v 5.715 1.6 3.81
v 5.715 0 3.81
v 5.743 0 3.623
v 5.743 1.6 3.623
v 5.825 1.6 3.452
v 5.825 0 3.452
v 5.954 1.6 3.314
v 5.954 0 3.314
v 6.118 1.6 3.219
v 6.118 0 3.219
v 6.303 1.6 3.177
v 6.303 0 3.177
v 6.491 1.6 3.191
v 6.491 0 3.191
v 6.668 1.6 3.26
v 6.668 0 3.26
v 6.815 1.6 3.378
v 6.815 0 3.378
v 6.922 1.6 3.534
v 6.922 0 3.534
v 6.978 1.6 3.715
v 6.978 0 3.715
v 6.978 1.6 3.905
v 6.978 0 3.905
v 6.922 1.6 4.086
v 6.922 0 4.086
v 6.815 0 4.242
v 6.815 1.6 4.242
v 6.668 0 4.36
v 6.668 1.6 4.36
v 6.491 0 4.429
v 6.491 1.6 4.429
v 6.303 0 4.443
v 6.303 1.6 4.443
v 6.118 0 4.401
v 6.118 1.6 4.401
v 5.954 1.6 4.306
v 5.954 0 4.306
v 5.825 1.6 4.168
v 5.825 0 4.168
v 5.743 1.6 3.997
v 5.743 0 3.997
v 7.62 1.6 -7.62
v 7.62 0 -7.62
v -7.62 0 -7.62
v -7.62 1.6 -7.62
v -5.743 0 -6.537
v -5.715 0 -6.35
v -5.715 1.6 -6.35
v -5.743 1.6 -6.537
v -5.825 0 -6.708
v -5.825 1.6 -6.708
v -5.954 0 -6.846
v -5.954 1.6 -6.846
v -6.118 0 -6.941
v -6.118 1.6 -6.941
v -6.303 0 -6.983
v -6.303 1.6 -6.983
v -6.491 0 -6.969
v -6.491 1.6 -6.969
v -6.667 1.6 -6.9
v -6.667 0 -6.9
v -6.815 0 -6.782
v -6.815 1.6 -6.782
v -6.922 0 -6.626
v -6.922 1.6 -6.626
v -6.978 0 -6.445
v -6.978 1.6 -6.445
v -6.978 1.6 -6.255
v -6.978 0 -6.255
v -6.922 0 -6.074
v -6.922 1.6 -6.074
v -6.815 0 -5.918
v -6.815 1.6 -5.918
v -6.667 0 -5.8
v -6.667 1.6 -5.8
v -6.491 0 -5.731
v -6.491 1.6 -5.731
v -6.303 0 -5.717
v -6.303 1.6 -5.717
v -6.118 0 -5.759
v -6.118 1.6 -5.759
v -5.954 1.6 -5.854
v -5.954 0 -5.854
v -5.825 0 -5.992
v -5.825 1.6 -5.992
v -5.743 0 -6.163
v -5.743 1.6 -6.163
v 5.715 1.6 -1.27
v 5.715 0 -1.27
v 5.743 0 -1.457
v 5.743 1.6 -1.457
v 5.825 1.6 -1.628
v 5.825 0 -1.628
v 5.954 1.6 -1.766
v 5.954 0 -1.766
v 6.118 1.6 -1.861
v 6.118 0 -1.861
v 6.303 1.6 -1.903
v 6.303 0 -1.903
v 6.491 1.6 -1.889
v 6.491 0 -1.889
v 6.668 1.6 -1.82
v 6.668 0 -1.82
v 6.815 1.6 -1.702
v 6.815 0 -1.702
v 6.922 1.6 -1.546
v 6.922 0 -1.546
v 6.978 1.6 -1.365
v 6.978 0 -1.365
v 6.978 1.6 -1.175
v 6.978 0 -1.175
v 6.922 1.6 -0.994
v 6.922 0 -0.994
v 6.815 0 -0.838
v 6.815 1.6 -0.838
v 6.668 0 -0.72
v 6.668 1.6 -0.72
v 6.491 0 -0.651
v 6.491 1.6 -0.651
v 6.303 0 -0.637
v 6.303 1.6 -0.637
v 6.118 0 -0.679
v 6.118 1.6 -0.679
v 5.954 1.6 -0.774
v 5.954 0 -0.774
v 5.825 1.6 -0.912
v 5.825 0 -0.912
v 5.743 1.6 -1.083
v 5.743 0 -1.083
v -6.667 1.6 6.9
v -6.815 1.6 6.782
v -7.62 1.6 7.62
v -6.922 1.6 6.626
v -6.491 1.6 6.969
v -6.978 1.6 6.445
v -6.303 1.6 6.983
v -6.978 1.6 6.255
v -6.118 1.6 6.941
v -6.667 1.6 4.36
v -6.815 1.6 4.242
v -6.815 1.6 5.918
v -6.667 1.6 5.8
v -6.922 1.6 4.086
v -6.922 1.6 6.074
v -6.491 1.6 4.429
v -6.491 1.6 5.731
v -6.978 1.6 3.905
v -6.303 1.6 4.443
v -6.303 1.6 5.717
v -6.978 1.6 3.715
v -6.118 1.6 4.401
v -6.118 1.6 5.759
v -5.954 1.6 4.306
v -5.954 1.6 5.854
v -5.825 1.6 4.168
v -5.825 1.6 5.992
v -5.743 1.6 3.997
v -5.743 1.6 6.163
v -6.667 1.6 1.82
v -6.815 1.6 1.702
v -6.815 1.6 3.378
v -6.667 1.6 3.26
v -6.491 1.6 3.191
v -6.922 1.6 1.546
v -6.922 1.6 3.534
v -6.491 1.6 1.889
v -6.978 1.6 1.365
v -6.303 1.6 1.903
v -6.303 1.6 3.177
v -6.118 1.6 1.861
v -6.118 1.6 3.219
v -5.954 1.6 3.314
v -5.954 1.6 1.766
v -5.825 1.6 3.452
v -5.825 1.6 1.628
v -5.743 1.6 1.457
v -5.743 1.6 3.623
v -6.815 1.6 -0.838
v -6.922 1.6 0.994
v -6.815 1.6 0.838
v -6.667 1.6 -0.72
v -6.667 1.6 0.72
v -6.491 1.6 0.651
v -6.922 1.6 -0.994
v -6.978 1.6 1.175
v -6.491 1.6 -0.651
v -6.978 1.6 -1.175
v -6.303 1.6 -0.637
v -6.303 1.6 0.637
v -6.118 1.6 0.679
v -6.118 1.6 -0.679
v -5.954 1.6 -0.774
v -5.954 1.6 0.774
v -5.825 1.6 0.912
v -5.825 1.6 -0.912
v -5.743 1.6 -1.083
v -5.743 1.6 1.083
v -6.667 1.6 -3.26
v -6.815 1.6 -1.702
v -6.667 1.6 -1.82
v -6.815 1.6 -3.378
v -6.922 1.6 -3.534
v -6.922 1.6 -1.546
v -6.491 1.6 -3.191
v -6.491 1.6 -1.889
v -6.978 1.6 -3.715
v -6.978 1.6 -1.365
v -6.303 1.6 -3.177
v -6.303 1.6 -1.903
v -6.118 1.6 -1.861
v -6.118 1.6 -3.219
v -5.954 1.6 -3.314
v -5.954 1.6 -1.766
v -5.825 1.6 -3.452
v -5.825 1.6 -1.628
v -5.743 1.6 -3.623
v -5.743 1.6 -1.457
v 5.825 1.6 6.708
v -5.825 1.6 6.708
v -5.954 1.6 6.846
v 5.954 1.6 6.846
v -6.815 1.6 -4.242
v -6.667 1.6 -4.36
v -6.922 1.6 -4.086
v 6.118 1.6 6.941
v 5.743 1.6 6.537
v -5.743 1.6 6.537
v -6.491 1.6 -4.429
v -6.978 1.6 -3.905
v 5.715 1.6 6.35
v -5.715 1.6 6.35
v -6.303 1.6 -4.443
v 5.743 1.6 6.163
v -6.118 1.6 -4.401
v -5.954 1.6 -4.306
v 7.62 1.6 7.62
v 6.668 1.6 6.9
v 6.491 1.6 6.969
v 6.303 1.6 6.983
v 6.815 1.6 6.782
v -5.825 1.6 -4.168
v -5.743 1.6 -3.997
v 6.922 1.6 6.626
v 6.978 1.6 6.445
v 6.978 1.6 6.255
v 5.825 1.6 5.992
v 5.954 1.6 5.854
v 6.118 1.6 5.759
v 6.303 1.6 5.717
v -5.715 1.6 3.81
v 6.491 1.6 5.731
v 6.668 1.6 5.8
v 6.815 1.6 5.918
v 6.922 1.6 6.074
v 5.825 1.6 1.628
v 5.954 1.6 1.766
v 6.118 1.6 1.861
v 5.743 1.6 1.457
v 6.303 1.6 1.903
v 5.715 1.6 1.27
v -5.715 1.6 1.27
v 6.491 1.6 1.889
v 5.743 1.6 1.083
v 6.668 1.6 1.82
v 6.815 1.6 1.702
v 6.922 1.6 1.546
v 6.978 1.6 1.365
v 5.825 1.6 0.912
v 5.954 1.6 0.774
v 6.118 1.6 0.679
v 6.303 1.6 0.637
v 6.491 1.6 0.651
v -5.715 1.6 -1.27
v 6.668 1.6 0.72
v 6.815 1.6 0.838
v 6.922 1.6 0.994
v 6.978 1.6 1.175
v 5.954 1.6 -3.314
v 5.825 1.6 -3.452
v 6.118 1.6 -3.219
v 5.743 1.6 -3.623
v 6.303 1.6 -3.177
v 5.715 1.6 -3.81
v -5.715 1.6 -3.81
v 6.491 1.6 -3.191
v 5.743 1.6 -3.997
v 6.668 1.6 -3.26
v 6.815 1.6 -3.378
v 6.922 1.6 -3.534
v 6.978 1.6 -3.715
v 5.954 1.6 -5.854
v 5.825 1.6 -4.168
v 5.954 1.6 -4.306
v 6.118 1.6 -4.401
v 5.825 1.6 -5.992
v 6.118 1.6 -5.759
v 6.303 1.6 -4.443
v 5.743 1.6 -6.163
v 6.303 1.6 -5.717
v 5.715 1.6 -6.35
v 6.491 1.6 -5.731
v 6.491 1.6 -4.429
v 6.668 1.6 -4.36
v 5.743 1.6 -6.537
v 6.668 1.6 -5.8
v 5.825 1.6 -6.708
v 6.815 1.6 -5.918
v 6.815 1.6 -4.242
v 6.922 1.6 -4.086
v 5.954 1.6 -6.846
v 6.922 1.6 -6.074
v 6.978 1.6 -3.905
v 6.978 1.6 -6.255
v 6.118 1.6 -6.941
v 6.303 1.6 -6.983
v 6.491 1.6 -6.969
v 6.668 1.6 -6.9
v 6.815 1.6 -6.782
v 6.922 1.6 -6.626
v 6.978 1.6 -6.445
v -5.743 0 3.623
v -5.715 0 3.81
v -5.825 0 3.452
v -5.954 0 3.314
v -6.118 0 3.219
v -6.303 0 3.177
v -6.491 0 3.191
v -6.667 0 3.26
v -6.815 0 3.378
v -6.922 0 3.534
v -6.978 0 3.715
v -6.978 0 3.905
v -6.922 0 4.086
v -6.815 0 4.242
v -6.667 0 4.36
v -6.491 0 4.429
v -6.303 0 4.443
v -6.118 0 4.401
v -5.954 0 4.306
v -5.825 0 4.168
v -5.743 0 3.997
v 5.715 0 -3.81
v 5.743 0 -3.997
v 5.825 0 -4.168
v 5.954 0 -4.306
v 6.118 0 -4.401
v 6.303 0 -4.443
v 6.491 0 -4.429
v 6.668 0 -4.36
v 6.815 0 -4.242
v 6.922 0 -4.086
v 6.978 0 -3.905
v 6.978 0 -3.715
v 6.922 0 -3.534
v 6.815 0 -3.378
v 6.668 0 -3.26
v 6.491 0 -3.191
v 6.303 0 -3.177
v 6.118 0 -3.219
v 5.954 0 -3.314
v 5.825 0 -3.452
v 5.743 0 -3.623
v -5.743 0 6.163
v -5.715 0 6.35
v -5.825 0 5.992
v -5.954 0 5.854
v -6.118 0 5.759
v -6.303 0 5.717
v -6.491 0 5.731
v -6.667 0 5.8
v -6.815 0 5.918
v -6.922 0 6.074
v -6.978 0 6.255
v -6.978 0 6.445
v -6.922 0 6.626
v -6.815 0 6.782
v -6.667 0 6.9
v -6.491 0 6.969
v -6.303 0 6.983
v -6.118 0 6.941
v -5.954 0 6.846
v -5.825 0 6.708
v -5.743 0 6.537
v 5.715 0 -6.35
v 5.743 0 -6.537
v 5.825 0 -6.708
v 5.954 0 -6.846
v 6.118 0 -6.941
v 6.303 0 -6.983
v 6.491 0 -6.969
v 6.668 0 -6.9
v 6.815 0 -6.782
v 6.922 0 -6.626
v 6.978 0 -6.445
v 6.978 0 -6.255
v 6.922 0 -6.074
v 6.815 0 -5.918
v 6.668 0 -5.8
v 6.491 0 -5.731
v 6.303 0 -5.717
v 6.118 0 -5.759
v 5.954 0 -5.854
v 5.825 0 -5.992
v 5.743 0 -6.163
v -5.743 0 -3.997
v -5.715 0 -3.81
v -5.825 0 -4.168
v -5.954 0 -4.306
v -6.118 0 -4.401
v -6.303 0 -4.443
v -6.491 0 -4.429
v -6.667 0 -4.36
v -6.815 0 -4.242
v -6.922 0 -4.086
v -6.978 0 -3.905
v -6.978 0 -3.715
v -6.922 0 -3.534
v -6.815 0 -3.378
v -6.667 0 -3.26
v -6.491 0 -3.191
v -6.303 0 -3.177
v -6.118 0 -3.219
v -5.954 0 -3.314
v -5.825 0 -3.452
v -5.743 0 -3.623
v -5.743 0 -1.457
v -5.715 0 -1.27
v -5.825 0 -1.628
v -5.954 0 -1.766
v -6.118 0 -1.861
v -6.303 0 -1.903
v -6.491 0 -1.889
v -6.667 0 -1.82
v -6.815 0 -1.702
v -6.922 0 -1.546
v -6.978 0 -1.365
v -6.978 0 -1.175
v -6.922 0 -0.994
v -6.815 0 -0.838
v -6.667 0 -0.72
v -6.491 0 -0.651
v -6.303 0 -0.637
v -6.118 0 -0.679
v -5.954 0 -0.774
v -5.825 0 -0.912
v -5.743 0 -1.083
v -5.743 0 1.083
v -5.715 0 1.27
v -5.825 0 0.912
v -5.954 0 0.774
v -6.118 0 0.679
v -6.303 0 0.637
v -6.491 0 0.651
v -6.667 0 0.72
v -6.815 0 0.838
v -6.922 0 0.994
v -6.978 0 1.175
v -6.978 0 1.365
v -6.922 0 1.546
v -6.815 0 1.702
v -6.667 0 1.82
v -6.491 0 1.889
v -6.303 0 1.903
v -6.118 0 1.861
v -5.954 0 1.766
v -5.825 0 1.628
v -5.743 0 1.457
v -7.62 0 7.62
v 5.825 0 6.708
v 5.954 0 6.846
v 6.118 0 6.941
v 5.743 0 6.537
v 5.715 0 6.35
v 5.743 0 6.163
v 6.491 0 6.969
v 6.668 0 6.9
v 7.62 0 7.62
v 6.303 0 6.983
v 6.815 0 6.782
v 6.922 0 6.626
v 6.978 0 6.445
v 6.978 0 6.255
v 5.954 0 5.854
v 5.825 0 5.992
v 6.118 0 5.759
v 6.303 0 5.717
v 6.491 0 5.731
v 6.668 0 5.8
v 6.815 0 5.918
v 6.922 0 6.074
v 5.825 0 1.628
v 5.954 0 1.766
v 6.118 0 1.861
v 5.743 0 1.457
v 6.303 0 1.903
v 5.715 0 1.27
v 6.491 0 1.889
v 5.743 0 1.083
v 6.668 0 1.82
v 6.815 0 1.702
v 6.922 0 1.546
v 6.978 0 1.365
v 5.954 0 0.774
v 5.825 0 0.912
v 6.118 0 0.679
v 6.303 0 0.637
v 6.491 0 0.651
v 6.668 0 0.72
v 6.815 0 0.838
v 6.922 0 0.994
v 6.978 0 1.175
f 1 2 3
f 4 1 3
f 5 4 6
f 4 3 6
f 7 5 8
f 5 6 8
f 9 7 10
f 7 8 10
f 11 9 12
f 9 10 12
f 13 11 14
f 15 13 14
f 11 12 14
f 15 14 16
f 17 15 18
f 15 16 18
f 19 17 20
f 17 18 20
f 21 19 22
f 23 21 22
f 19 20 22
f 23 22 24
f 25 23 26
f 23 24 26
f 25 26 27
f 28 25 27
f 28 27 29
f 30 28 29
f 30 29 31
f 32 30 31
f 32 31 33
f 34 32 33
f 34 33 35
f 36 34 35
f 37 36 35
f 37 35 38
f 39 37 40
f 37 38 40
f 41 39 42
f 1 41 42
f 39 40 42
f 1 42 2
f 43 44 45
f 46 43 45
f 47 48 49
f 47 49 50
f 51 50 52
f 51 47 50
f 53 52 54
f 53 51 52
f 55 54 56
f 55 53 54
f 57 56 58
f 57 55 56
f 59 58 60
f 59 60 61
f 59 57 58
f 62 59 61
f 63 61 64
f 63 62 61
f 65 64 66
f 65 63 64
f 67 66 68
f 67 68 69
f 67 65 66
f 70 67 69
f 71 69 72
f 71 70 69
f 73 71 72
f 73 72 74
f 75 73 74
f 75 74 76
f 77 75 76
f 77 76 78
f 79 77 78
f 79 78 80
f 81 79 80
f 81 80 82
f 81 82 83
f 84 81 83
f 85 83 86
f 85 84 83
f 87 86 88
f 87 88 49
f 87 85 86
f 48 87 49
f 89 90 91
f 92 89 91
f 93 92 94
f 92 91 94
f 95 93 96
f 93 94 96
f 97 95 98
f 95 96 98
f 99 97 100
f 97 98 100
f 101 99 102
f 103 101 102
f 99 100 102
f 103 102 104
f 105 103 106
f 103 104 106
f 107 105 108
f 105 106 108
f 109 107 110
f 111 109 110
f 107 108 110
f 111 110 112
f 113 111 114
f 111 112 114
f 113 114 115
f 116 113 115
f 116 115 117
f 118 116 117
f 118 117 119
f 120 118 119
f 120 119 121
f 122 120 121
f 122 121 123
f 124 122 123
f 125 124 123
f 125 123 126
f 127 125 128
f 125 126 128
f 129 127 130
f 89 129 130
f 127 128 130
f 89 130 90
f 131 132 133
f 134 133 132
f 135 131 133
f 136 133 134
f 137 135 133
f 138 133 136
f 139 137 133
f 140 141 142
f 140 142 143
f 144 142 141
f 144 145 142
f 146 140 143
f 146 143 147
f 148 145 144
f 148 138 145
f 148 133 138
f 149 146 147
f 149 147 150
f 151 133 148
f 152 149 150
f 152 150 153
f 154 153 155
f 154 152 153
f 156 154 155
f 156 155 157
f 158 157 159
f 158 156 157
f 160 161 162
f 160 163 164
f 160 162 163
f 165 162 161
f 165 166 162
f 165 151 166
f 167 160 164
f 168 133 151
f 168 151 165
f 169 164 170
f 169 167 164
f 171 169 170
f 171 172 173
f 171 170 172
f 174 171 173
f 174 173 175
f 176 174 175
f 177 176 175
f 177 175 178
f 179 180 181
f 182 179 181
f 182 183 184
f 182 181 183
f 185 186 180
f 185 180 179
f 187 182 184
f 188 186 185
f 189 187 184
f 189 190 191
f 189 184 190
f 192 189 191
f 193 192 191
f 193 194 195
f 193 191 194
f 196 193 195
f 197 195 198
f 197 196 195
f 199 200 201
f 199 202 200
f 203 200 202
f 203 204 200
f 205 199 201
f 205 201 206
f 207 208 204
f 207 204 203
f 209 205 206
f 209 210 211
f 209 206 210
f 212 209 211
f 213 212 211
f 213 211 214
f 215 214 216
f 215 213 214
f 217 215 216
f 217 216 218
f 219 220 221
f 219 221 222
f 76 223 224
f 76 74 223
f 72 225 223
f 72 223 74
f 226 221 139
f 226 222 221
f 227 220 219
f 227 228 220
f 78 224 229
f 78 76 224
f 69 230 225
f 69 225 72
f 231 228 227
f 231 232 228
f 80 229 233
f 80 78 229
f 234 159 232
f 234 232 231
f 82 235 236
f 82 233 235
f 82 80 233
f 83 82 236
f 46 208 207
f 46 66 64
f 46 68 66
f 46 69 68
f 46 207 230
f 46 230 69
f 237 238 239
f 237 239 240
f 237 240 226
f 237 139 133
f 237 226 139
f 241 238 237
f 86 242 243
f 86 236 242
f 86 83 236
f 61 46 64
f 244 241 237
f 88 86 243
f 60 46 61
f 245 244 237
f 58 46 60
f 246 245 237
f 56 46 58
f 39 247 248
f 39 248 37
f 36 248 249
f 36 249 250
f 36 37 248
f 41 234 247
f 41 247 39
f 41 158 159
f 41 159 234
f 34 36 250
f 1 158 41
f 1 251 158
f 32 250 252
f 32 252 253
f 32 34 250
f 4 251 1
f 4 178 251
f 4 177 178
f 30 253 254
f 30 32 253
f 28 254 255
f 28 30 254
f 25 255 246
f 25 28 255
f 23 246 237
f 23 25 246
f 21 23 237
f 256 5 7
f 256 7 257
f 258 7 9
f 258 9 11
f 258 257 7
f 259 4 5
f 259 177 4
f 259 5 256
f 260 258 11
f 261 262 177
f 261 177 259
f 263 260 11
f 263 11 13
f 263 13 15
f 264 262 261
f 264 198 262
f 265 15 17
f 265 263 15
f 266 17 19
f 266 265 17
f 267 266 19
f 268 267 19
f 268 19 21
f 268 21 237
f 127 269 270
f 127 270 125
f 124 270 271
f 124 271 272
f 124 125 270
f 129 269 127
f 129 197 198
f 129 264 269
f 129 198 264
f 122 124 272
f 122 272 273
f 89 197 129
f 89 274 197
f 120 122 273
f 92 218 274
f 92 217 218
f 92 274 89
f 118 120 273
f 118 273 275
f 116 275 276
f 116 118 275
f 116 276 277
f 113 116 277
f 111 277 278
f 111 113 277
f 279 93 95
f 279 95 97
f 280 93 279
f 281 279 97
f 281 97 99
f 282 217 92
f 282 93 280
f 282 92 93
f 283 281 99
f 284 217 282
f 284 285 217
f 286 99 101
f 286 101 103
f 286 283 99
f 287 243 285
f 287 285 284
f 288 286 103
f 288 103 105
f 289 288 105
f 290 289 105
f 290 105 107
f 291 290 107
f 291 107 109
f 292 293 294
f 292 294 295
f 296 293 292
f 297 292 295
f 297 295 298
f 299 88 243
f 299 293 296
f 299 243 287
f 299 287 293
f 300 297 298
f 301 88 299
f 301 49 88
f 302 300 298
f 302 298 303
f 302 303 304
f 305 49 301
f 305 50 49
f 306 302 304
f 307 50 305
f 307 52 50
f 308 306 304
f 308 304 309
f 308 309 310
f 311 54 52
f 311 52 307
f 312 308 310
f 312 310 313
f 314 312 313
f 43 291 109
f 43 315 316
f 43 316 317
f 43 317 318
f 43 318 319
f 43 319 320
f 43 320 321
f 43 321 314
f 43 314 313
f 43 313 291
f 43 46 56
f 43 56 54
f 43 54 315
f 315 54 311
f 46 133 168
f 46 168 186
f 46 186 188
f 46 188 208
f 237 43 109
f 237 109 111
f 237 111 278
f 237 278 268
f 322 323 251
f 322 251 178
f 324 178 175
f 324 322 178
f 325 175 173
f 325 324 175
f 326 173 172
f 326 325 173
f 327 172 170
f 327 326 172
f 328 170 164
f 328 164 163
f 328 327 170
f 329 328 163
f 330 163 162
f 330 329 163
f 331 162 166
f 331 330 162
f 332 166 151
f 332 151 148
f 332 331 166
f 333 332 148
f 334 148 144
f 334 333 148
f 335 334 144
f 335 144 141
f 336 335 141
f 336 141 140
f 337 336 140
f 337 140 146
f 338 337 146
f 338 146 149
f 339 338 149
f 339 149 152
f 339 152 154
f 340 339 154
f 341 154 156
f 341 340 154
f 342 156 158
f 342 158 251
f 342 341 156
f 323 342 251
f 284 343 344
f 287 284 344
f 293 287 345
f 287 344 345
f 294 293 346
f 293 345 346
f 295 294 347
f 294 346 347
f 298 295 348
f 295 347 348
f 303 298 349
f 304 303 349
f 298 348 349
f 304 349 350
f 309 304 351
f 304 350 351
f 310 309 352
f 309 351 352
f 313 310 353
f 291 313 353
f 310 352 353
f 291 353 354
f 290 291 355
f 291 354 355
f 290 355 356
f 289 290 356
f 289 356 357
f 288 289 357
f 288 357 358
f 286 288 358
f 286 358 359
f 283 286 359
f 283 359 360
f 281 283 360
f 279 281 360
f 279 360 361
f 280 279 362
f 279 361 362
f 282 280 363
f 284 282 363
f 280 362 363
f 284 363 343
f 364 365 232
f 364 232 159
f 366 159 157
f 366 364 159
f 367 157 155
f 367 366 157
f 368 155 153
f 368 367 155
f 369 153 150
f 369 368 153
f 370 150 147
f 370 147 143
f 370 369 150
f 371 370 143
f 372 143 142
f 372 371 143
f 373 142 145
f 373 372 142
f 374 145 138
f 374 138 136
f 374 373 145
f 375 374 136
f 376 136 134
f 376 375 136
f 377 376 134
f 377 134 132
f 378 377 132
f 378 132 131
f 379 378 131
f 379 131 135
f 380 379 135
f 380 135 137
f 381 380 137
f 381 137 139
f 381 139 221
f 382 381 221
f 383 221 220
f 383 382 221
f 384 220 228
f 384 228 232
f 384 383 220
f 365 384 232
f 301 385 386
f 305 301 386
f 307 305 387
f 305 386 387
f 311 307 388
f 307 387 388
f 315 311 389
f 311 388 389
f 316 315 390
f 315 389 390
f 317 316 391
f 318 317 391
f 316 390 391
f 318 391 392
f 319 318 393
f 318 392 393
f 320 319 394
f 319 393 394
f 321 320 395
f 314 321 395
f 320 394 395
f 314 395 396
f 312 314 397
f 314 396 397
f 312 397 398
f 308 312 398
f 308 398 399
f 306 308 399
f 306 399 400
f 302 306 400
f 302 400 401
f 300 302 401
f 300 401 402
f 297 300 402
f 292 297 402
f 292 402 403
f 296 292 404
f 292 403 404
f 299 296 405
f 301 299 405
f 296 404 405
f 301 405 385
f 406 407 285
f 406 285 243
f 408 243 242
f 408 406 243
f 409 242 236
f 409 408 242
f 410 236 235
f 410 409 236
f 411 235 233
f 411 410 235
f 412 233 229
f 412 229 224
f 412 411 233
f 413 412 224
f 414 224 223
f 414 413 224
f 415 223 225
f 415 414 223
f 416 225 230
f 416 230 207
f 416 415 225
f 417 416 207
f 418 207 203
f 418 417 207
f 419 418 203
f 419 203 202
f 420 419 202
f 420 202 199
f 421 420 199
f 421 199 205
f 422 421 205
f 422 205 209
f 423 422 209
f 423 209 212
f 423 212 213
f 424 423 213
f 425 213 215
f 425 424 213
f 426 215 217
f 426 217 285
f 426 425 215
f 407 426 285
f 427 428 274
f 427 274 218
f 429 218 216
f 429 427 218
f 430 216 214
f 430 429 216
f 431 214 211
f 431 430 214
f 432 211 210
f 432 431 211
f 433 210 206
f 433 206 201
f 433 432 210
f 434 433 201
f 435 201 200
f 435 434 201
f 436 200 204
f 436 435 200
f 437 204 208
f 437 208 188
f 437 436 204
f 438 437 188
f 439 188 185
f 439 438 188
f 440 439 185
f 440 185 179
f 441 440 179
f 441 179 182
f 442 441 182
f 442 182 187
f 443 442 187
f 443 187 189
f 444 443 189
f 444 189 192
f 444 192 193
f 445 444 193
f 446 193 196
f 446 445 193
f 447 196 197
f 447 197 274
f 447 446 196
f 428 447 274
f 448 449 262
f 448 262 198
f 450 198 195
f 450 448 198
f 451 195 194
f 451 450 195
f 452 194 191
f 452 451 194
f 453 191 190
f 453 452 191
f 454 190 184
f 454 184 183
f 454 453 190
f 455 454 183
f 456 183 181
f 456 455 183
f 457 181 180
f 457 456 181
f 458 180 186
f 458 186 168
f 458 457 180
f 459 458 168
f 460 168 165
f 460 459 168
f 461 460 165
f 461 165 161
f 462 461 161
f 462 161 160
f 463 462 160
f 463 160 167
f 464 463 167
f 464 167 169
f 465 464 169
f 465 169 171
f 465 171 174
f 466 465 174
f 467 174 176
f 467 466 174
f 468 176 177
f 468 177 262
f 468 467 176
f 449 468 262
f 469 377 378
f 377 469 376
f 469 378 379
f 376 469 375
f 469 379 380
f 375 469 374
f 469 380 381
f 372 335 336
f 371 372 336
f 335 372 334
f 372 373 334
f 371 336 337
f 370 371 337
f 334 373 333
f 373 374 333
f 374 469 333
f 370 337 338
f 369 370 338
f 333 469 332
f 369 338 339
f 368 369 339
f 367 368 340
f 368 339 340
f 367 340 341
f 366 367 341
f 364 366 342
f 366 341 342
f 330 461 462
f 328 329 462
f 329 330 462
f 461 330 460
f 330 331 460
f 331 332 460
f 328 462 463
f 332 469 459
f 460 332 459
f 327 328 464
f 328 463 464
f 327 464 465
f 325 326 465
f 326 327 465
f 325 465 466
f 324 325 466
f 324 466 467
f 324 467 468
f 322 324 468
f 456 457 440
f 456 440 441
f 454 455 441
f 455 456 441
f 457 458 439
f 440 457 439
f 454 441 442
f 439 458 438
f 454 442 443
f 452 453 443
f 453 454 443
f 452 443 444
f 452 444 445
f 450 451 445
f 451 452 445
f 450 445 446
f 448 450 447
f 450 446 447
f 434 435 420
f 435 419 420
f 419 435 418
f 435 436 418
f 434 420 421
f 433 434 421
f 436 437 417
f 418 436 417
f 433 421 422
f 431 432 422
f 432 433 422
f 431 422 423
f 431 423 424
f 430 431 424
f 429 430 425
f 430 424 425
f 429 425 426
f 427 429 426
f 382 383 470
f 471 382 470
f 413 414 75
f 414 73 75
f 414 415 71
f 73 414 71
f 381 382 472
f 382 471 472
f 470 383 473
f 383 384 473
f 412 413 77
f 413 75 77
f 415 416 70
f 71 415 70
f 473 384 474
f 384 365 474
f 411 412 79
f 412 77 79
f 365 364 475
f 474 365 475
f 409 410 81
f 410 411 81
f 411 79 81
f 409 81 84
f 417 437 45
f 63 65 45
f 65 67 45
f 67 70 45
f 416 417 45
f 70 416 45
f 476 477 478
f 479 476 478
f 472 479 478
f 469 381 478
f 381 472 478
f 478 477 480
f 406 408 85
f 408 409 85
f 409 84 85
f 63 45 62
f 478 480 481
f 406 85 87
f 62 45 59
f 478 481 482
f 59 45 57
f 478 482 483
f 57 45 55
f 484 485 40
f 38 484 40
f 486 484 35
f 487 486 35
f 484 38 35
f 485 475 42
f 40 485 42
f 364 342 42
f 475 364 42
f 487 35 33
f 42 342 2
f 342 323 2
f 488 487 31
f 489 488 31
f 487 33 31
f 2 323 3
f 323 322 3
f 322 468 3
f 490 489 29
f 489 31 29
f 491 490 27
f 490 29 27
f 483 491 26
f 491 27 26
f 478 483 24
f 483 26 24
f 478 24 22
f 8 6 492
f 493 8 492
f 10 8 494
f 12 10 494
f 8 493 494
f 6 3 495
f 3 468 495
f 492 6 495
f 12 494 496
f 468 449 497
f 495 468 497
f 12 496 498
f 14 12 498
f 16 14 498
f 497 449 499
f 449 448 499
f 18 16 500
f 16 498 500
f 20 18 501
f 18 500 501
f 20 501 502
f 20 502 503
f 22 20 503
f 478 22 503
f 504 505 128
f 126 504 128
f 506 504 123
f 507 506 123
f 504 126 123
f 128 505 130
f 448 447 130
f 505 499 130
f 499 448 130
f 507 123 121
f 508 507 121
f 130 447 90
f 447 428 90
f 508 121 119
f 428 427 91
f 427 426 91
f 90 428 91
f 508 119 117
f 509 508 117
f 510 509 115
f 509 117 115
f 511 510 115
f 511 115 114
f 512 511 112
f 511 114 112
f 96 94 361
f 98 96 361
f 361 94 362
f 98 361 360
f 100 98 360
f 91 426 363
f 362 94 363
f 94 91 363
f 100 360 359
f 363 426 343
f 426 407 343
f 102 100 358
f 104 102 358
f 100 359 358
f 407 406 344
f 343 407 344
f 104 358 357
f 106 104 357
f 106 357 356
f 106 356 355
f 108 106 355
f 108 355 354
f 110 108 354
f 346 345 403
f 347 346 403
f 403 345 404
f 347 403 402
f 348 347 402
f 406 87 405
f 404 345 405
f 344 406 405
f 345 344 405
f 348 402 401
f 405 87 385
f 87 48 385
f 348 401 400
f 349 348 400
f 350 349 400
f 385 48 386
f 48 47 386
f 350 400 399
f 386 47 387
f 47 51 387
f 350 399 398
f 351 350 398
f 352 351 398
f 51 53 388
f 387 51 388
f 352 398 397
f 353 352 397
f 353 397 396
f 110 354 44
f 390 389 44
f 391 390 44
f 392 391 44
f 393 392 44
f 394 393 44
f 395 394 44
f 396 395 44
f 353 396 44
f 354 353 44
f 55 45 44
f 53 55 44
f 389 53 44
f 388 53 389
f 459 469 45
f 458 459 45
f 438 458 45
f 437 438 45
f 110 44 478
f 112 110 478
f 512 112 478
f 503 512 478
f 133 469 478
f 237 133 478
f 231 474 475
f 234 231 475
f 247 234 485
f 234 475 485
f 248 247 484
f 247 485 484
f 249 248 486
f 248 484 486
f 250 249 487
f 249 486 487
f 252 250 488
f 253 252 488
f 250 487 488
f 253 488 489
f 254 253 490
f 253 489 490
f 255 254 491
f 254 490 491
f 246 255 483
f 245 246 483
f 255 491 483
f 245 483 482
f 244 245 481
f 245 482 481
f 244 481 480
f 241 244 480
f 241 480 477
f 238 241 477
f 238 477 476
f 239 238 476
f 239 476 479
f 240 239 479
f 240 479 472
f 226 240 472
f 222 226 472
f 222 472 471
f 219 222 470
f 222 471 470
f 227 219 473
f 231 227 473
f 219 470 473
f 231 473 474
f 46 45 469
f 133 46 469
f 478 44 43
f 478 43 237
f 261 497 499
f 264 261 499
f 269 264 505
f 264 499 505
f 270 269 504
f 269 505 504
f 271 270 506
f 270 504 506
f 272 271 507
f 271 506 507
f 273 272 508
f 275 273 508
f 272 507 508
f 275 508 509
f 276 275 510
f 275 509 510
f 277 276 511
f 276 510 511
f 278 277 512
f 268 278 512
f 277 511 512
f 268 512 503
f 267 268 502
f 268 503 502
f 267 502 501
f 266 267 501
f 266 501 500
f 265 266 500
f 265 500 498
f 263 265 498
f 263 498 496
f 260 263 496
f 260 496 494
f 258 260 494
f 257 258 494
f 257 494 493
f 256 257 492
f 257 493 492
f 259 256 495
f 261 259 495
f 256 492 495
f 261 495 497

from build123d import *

# Parameters (mm, degrees)
SKETCH1_R           = 0.635
BOSS_EXTRUDE1_DEPTH = 1.6


with BuildPart() as part:
    # Sketch1 → Boss-Extrude1 (new body)
    with BuildSketch(Plane(origin=(0, 0, 0), x_dir=(1, 0, 0), z_dir=(0, 1, 0))):
        Polygon((0, 7.62), (0, -7.62), (-7.62, -7.62), (-7.62, 0), (-7.62, 7.62), align=None)
        with Locations((-6.35, 6.35)):
            Circle(SKETCH1_R, mode=Mode.SUBTRACT)
        with Locations((-6.35, 3.81)):
            Circle(SKETCH1_R, mode=Mode.SUBTRACT)
        with Locations((-6.35, 1.27)):
            Circle(SKETCH1_R, mode=Mode.SUBTRACT)
        with Locations((-6.35, -1.27)):
            Circle(SKETCH1_R, mode=Mode.SUBTRACT)
        with Locations((-6.35, -3.81)):
            Circle(SKETCH1_R, mode=Mode.SUBTRACT)
        with Locations((-6.35, -6.35)):
            Circle(SKETCH1_R, mode=Mode.SUBTRACT)
    boss_extrude1 = extrude(amount=BOSS_EXTRUDE1_DEPTH)

    # Mirror1: Boss-Extrude1 across plane
    add(boss_extrude1.mirror(Plane(origin=(0, 1.6, -7.62), x_dir=(0, 0, 1), z_dir=(-1, 0, 0))))


solid = part.part
